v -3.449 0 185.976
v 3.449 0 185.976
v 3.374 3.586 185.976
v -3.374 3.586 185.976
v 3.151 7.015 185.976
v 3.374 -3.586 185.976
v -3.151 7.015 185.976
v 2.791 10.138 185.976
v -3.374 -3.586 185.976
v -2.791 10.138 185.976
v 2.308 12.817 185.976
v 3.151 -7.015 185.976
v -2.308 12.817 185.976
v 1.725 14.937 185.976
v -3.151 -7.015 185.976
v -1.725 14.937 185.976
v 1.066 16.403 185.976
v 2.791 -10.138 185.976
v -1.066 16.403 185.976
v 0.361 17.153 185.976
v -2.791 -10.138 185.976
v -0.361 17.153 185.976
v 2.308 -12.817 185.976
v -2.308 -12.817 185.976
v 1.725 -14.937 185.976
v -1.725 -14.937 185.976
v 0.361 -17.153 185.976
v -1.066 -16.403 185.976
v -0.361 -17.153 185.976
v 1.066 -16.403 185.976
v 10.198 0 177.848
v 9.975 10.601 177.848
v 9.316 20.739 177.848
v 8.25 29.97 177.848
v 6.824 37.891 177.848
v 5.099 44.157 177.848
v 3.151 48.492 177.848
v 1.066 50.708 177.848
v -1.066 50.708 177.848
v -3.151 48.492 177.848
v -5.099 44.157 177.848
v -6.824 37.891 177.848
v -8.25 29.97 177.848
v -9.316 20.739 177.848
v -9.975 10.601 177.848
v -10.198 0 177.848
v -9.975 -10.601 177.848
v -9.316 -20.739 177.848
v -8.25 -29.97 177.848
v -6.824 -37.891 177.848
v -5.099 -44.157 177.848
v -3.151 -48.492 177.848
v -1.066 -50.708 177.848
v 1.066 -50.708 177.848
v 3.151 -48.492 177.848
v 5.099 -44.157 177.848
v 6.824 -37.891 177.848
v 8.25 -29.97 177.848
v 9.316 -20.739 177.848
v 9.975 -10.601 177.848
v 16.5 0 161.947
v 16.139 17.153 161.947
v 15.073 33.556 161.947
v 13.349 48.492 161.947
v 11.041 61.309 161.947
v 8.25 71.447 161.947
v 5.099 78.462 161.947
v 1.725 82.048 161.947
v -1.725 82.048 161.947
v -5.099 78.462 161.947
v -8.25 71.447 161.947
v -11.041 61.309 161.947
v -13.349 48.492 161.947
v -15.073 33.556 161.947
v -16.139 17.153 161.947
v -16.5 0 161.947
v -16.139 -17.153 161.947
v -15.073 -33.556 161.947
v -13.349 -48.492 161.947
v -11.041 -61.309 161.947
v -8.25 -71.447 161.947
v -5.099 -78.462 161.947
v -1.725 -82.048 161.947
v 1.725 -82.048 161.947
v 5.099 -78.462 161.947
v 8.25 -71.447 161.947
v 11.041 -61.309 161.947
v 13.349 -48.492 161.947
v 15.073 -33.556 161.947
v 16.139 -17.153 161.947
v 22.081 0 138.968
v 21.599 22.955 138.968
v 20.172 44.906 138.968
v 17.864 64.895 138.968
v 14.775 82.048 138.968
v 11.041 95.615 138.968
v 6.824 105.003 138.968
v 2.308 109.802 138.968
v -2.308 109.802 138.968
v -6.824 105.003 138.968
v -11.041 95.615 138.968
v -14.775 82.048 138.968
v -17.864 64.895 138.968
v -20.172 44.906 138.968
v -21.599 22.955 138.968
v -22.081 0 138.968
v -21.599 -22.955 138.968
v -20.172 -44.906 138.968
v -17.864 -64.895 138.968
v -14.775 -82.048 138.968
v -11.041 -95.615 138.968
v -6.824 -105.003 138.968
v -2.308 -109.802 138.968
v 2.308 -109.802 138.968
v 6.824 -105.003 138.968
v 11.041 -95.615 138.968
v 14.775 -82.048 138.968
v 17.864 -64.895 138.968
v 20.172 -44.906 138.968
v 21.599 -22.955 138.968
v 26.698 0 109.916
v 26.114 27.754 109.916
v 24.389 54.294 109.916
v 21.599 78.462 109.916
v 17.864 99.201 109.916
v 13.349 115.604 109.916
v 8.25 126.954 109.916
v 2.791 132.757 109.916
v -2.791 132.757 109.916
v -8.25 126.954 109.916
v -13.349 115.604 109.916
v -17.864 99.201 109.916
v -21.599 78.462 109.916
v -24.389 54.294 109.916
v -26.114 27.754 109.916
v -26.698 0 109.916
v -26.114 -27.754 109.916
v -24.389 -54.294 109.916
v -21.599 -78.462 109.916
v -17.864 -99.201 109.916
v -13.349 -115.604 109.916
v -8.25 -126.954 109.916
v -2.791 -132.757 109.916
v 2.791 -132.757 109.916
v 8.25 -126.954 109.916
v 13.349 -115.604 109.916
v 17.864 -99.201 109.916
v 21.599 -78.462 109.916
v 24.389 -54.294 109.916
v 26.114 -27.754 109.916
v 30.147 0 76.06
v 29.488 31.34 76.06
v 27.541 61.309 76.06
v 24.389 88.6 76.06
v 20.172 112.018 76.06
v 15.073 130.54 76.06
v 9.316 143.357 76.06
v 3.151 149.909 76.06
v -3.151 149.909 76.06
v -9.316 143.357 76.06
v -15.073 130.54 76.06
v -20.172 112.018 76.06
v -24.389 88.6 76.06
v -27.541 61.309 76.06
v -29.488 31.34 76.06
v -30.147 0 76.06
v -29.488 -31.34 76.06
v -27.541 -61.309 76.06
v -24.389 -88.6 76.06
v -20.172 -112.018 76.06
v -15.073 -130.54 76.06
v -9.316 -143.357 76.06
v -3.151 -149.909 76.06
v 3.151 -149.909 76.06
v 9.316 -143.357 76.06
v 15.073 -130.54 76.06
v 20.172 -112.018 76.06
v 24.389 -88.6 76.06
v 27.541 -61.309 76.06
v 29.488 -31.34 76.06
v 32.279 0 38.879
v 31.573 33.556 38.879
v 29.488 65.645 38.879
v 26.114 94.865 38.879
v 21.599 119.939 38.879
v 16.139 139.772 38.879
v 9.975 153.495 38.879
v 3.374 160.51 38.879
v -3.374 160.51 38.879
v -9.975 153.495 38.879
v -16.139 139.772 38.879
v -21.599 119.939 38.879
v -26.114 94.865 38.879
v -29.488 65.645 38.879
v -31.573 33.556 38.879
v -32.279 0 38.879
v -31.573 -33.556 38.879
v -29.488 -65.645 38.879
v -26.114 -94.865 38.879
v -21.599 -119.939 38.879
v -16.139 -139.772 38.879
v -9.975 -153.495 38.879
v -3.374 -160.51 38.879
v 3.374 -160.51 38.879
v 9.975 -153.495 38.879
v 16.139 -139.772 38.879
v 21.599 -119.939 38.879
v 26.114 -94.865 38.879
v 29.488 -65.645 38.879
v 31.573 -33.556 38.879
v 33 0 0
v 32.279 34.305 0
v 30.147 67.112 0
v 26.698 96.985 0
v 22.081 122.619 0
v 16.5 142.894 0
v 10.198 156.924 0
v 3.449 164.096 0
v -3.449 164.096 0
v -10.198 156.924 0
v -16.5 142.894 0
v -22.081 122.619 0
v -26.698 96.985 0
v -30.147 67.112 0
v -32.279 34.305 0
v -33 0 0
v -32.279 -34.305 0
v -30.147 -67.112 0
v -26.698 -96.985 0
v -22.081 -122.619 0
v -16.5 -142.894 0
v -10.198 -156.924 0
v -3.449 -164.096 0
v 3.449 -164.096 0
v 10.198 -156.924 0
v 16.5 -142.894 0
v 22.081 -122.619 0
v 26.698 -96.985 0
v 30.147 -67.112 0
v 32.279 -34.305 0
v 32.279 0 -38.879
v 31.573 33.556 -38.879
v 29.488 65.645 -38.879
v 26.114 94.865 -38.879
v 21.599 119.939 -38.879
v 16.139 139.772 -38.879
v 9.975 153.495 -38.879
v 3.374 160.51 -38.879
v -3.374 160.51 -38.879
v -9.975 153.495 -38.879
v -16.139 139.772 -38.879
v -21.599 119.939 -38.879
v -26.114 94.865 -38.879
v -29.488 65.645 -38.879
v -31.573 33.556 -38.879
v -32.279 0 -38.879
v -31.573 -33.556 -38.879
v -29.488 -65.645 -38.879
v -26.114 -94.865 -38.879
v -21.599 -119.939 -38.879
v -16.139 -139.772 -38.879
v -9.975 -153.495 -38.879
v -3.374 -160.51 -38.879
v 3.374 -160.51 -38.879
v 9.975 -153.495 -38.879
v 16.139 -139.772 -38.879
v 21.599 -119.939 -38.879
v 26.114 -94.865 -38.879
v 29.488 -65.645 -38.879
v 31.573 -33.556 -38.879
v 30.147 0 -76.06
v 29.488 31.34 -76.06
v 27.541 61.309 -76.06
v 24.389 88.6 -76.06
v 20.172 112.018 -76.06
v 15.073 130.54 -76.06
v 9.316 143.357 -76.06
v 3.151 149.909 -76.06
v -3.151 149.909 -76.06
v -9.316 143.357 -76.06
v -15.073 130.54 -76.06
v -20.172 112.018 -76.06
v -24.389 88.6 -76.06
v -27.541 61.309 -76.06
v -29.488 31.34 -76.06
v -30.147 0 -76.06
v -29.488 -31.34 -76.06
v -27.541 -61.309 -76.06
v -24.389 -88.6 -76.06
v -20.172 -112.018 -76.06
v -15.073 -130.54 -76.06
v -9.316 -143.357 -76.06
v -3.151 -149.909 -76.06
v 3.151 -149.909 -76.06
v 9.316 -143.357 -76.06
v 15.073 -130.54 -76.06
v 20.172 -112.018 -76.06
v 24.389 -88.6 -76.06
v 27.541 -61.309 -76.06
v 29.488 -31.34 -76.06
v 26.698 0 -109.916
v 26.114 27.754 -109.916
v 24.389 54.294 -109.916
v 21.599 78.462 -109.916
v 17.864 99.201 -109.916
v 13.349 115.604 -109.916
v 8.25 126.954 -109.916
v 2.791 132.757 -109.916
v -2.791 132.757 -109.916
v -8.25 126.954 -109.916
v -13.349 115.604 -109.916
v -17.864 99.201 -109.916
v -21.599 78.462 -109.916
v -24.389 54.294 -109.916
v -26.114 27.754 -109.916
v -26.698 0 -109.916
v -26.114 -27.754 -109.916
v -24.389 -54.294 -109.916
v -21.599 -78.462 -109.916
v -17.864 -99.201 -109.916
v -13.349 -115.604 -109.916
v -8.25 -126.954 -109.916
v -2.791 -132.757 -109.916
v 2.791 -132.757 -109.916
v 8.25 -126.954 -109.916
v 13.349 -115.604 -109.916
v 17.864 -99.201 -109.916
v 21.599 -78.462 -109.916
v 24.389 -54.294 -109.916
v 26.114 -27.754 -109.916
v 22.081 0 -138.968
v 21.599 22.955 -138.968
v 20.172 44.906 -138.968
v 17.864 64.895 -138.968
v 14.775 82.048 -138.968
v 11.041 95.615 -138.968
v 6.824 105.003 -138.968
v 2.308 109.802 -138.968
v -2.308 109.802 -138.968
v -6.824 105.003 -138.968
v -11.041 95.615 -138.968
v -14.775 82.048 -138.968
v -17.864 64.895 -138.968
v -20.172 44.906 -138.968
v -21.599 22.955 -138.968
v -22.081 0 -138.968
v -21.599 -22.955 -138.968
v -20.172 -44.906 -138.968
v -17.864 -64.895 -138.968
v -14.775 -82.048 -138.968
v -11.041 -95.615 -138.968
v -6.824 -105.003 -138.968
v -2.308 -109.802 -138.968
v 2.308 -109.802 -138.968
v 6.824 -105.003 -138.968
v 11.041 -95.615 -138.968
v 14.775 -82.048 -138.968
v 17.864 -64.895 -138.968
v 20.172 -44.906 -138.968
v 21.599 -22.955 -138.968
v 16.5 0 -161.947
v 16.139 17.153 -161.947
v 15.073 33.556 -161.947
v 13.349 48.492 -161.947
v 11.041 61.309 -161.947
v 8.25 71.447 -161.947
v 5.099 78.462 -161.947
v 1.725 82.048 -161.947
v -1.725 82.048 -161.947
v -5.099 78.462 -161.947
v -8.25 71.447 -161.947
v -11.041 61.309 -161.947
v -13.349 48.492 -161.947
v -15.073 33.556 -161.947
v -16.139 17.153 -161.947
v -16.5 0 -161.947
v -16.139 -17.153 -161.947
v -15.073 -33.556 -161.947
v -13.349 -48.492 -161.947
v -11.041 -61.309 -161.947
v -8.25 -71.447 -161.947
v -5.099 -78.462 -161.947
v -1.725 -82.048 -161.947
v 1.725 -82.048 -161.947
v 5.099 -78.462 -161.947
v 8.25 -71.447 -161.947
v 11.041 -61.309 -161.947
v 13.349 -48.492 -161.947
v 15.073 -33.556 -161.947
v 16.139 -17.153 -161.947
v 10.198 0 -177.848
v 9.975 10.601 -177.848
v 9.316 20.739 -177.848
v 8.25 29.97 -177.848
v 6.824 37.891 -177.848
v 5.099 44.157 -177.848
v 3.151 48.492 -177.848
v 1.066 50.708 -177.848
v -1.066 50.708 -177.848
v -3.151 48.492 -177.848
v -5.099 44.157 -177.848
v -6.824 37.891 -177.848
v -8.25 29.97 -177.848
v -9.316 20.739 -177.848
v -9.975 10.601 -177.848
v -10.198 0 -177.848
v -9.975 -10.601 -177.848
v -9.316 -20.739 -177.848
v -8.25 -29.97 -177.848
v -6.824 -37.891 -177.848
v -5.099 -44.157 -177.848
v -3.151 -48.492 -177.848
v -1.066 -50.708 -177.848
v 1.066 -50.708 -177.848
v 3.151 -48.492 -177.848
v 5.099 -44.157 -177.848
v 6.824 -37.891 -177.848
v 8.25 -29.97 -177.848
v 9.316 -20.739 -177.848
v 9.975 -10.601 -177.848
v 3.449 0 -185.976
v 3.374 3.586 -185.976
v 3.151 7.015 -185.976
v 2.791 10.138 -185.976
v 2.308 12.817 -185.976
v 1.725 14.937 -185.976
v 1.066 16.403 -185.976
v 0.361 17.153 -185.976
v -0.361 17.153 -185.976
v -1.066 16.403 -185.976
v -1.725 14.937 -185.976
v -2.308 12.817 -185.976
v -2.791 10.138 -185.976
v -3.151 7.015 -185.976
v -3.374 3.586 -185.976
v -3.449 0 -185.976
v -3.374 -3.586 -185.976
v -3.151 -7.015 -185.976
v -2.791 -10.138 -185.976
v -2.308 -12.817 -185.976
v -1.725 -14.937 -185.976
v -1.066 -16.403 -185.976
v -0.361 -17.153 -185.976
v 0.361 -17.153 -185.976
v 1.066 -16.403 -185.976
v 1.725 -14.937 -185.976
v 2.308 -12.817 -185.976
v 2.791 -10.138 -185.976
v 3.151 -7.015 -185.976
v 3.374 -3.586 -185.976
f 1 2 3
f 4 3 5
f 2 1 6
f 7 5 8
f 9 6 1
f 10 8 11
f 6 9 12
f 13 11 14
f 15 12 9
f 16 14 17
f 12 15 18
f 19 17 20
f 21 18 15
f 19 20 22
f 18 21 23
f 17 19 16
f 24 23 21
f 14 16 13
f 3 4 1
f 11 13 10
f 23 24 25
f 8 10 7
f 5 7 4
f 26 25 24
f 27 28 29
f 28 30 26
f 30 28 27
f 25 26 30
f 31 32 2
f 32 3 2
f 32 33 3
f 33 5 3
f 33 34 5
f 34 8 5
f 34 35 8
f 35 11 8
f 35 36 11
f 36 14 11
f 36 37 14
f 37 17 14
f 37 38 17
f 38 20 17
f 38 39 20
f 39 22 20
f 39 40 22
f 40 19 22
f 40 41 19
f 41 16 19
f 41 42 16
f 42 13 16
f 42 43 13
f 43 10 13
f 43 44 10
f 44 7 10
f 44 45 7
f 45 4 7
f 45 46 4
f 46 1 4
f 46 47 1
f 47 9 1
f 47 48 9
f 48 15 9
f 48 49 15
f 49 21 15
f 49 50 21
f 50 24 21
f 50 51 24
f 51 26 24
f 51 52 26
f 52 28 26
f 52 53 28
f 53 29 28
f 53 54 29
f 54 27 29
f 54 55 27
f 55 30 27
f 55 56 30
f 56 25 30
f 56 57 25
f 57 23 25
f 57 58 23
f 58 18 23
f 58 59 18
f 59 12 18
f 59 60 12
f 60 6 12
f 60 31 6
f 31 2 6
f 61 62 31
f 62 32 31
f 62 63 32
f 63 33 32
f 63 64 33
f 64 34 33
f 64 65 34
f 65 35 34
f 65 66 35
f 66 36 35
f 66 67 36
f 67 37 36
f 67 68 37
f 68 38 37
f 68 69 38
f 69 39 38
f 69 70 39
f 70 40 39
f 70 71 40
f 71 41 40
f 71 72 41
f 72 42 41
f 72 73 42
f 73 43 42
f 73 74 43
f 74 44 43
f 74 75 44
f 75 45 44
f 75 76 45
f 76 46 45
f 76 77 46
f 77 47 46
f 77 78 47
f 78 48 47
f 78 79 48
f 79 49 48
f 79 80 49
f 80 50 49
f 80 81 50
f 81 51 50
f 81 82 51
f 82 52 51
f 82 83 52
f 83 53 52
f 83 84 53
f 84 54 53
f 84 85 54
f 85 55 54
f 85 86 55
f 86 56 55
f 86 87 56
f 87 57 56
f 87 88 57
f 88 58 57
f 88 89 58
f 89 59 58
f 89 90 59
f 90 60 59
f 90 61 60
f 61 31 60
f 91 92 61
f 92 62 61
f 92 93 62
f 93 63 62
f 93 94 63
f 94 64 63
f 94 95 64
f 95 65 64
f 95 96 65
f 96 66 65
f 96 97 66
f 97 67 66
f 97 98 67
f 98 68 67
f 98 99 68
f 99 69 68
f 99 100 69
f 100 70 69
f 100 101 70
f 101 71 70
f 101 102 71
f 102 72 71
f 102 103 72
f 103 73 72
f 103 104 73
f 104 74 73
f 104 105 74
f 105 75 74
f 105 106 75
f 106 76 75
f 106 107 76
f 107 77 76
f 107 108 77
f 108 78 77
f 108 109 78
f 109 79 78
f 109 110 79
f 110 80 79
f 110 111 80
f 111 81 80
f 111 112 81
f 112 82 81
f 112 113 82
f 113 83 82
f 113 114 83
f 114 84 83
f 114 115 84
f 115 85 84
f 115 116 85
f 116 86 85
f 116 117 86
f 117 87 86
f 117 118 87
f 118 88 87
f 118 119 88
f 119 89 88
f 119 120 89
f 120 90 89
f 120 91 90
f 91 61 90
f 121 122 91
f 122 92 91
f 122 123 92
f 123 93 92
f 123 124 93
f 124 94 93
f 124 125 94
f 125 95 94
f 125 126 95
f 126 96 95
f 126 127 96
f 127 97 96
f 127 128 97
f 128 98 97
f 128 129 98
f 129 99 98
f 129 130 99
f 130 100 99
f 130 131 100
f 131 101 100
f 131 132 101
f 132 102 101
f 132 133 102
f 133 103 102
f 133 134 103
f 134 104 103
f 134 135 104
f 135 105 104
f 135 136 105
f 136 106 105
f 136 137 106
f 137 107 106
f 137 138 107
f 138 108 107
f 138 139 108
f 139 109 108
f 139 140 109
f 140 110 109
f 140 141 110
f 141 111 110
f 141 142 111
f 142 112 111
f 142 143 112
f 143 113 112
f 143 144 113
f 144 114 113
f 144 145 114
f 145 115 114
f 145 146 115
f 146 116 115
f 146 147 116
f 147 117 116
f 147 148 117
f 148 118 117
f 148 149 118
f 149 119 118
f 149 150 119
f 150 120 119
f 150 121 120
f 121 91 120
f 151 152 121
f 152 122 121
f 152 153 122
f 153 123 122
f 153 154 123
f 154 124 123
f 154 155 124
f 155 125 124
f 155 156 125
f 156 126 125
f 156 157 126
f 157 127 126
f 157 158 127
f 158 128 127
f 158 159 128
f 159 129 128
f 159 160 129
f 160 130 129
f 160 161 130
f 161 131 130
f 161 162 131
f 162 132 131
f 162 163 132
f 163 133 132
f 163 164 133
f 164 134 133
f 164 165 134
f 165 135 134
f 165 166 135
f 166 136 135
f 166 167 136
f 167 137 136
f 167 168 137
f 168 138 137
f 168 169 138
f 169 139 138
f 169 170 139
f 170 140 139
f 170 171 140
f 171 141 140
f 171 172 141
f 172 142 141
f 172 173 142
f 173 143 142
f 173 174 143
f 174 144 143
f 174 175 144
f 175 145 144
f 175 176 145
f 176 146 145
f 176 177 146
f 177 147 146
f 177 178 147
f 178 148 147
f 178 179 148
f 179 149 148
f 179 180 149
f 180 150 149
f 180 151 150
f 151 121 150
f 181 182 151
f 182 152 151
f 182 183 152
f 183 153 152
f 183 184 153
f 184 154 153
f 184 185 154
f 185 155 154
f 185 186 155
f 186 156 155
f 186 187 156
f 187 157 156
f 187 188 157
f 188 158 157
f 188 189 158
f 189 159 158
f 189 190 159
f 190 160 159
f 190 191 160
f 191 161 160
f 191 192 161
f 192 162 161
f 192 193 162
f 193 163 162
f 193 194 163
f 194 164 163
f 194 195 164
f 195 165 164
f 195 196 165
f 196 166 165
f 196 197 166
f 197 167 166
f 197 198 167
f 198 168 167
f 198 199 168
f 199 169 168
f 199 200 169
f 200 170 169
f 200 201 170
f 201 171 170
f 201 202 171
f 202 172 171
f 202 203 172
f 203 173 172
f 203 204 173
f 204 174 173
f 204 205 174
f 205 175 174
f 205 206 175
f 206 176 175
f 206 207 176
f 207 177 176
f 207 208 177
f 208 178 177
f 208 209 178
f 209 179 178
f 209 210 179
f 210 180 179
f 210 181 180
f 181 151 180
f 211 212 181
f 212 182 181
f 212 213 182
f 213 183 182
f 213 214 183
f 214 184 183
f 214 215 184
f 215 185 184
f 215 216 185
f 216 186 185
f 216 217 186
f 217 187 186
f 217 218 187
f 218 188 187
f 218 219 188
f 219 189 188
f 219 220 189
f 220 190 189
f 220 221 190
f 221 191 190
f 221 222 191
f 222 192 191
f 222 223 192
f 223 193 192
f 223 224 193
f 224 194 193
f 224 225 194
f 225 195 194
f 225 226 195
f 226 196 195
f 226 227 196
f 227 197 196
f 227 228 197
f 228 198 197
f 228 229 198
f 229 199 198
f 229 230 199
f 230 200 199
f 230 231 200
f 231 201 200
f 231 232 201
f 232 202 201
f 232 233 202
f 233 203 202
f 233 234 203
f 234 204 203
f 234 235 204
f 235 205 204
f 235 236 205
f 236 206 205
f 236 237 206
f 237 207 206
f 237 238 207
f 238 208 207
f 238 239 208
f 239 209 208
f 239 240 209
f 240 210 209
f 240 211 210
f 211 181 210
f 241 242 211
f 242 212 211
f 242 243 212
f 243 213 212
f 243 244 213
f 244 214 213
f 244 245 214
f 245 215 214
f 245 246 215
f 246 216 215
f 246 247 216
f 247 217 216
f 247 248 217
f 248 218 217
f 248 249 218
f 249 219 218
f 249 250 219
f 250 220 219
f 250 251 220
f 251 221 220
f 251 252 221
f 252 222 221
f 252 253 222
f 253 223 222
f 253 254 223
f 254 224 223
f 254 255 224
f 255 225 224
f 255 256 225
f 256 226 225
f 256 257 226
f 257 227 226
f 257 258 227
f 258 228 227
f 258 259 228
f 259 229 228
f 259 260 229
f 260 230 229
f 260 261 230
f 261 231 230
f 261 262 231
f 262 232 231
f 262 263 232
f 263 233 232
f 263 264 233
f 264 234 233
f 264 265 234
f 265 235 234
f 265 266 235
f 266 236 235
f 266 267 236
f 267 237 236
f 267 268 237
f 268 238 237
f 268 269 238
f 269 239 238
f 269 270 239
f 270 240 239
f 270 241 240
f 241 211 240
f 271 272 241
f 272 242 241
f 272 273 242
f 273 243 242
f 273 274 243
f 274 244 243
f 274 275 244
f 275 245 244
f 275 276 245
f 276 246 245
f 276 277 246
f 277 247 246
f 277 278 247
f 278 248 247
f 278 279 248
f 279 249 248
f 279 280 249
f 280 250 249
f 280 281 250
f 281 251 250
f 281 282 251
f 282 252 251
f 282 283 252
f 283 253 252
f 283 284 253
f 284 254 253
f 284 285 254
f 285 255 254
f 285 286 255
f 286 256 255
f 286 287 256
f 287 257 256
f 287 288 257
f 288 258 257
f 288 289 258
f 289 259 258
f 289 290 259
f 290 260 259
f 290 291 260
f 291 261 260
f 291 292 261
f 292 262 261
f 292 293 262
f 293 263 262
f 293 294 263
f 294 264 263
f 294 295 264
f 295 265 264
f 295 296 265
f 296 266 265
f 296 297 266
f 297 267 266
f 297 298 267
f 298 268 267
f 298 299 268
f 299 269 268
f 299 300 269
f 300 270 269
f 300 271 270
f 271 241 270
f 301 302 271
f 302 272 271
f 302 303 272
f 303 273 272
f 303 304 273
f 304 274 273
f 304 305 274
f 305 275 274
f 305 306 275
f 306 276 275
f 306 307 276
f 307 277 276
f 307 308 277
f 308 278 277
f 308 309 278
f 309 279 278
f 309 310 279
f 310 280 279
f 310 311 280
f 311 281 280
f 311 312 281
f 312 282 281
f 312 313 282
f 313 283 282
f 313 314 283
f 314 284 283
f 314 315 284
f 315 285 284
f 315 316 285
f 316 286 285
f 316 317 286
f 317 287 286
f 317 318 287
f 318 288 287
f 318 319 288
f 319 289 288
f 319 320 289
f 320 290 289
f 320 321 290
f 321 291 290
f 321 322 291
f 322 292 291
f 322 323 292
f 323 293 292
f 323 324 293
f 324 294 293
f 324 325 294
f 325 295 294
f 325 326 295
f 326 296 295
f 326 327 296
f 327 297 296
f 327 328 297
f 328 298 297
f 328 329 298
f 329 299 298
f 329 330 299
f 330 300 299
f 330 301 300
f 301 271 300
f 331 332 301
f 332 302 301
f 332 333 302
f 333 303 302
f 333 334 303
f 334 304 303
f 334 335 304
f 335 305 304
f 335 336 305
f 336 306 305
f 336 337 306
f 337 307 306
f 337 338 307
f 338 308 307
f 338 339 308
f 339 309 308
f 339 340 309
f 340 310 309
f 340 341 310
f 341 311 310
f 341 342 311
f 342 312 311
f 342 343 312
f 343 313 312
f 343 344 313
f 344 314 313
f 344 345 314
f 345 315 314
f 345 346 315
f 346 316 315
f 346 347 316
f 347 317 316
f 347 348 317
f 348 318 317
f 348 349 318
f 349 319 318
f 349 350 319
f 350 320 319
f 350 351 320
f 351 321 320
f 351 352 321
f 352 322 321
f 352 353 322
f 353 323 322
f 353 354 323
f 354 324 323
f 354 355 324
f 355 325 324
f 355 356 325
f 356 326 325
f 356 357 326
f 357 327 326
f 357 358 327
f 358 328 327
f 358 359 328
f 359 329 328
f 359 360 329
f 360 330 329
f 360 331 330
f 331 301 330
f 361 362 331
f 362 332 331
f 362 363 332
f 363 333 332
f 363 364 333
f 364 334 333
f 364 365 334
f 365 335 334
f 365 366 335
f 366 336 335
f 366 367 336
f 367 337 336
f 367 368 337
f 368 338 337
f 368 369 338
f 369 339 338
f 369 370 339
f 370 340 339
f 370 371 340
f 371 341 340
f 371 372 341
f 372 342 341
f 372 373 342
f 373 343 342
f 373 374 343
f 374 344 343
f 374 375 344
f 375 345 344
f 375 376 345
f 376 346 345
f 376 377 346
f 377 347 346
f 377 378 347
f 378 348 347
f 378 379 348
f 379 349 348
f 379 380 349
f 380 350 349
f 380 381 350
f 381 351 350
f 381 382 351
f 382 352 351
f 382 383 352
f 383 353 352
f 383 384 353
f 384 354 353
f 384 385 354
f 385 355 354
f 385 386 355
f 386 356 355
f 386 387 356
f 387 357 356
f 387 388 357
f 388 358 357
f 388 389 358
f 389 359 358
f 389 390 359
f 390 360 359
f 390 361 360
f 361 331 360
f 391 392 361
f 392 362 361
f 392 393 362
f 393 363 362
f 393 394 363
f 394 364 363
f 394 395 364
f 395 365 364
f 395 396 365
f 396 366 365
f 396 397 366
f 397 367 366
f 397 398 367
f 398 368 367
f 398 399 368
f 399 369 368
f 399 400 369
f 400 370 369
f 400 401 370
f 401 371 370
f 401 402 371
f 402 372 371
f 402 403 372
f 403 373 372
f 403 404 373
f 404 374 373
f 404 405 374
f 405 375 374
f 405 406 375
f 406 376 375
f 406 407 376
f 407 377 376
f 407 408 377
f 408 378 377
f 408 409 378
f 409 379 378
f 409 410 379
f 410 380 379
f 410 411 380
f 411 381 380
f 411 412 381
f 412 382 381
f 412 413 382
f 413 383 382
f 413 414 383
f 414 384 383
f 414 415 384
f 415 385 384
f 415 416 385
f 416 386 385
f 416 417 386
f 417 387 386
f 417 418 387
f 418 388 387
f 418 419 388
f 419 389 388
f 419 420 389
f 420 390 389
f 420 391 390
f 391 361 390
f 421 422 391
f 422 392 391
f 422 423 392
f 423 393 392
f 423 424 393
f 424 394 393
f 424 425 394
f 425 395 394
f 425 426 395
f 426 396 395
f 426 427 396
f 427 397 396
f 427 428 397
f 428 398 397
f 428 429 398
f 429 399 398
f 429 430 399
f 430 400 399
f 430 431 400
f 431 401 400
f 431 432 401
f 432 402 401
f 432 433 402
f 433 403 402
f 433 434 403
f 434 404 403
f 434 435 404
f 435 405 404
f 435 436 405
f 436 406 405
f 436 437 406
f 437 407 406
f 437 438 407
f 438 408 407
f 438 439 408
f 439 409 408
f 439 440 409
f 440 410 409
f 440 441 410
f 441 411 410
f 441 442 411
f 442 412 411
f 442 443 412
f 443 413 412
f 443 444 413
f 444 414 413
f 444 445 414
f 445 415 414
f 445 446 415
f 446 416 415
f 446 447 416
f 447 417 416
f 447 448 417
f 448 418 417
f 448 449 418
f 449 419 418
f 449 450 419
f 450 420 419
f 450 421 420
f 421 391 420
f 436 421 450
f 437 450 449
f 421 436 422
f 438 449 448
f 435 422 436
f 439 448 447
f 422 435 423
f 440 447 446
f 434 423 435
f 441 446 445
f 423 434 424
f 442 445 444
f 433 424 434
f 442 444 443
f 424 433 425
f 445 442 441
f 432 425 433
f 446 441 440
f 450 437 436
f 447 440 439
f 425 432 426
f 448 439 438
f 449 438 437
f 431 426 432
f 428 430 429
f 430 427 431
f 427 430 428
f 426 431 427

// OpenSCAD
// Generated by SolidPython 1.0.1 on 2020-07-29 00:46:45


scale(v = [3, 15, 17]) {
	sphere(r = 11);
}
/***********************************************
*********      SolidPython code:      **********
************************************************
 
# import packages: SolidPython
from solid import *
from solid.utils import *
from itertools import chain, combinations, permutations


class Resize:

    def __init__(self, scad_file):
        self.scad_file = scad_file
        #self.scad_file = import_scad(scad_file)
        # cone/cylinder param:
        self.r1 = 0
        self.r2 = 0
        self.h = 0
        # rectangular prism param:
        self.w = 0
        self.l = 0
        # ellipse param:
        self.r = 0

    # import OpenScad code (file name corresponds to shape)


    # classify shape + parameters
    def assign(self, param1, param2, param3):
        if self.scad_file == 'cone.scad':
            self.r1 = param1
            self.r2 = param2
            self.h = param3
        elif self.scad_file == 'cylinder.scad':
            self.r1 = param1
            self.r2 = param2
            self.h = param3
        elif self.scad_file == 'rectangularPrism.scad':
            self.h = param1
            self.l = param2
            self.w = param3
        else:
            self.r = param1
            self.h = param2

    # resize parameters
    def iterate(self):
        x = range(3, 20, 2)
        i = 1
        if self.scad_file == 'cone.scad':
            tempList = list(permutations(x, 2))
            for temp in tempList:
                param1 = temp[0]
                param2 = temp[1]
                filepath = 'produced_scad_files/' + 'cone' + str(param1) + '_' + str(param2) + '_' + '.scad'
                scad_render_to_file(cylinder(h=param1, r1=param2, r2=0), filepath)

        elif self.scad_file == 'cylinder.scad':
            tempList = list(permutations(x, 3))
            for temp in tempList:
                param1 = temp[0]
                param2 = temp[1]
                filepath = 'produced_scad_files/' + 'cylinder' + str(param1) + '_' + str(param2) + '_' + '.scad'
                scad_render_to_file(cylinder(h=param1, r1=param2, r2=param2), filepath)

        elif self.scad_file == 'rectangularPrism.scad':
            tempList = list(permutations(x, 3))
            for temp in tempList:
                param1 = temp[0]
                param2 = temp[1]
                param3 = temp[2]
                filepath = 'produced_scad_files/' + 'rectangularPrism' + str(param1) + '_' + str(param2) + '_' + str(
                    param3) + '.scad'
                scad_render_to_file(cube(size=(param1, param2, param3)), filepath)

        elif self.scad_file == 'ellipse.scad':
            tempList = list(permutations(x, 4))
            for temp in tempList:
                param1 = temp[0]
                param2 = temp[1]
                param3 = temp[2]
                param4 = temp[3]
                filepath = 'produced_scad_files/' + 'ellipse' + str(param1) + '_' + str(param2) + '_' + str(param3) + '_' + str(param4) + '.scad'
                scad_render_to_file(scale([param1, param2, param3])(sphere(r=param4)), filepath)

    def render_to_scadfile(self):
        scad_render_to_file(scad, 'example.scad') 
 
************************************************/
